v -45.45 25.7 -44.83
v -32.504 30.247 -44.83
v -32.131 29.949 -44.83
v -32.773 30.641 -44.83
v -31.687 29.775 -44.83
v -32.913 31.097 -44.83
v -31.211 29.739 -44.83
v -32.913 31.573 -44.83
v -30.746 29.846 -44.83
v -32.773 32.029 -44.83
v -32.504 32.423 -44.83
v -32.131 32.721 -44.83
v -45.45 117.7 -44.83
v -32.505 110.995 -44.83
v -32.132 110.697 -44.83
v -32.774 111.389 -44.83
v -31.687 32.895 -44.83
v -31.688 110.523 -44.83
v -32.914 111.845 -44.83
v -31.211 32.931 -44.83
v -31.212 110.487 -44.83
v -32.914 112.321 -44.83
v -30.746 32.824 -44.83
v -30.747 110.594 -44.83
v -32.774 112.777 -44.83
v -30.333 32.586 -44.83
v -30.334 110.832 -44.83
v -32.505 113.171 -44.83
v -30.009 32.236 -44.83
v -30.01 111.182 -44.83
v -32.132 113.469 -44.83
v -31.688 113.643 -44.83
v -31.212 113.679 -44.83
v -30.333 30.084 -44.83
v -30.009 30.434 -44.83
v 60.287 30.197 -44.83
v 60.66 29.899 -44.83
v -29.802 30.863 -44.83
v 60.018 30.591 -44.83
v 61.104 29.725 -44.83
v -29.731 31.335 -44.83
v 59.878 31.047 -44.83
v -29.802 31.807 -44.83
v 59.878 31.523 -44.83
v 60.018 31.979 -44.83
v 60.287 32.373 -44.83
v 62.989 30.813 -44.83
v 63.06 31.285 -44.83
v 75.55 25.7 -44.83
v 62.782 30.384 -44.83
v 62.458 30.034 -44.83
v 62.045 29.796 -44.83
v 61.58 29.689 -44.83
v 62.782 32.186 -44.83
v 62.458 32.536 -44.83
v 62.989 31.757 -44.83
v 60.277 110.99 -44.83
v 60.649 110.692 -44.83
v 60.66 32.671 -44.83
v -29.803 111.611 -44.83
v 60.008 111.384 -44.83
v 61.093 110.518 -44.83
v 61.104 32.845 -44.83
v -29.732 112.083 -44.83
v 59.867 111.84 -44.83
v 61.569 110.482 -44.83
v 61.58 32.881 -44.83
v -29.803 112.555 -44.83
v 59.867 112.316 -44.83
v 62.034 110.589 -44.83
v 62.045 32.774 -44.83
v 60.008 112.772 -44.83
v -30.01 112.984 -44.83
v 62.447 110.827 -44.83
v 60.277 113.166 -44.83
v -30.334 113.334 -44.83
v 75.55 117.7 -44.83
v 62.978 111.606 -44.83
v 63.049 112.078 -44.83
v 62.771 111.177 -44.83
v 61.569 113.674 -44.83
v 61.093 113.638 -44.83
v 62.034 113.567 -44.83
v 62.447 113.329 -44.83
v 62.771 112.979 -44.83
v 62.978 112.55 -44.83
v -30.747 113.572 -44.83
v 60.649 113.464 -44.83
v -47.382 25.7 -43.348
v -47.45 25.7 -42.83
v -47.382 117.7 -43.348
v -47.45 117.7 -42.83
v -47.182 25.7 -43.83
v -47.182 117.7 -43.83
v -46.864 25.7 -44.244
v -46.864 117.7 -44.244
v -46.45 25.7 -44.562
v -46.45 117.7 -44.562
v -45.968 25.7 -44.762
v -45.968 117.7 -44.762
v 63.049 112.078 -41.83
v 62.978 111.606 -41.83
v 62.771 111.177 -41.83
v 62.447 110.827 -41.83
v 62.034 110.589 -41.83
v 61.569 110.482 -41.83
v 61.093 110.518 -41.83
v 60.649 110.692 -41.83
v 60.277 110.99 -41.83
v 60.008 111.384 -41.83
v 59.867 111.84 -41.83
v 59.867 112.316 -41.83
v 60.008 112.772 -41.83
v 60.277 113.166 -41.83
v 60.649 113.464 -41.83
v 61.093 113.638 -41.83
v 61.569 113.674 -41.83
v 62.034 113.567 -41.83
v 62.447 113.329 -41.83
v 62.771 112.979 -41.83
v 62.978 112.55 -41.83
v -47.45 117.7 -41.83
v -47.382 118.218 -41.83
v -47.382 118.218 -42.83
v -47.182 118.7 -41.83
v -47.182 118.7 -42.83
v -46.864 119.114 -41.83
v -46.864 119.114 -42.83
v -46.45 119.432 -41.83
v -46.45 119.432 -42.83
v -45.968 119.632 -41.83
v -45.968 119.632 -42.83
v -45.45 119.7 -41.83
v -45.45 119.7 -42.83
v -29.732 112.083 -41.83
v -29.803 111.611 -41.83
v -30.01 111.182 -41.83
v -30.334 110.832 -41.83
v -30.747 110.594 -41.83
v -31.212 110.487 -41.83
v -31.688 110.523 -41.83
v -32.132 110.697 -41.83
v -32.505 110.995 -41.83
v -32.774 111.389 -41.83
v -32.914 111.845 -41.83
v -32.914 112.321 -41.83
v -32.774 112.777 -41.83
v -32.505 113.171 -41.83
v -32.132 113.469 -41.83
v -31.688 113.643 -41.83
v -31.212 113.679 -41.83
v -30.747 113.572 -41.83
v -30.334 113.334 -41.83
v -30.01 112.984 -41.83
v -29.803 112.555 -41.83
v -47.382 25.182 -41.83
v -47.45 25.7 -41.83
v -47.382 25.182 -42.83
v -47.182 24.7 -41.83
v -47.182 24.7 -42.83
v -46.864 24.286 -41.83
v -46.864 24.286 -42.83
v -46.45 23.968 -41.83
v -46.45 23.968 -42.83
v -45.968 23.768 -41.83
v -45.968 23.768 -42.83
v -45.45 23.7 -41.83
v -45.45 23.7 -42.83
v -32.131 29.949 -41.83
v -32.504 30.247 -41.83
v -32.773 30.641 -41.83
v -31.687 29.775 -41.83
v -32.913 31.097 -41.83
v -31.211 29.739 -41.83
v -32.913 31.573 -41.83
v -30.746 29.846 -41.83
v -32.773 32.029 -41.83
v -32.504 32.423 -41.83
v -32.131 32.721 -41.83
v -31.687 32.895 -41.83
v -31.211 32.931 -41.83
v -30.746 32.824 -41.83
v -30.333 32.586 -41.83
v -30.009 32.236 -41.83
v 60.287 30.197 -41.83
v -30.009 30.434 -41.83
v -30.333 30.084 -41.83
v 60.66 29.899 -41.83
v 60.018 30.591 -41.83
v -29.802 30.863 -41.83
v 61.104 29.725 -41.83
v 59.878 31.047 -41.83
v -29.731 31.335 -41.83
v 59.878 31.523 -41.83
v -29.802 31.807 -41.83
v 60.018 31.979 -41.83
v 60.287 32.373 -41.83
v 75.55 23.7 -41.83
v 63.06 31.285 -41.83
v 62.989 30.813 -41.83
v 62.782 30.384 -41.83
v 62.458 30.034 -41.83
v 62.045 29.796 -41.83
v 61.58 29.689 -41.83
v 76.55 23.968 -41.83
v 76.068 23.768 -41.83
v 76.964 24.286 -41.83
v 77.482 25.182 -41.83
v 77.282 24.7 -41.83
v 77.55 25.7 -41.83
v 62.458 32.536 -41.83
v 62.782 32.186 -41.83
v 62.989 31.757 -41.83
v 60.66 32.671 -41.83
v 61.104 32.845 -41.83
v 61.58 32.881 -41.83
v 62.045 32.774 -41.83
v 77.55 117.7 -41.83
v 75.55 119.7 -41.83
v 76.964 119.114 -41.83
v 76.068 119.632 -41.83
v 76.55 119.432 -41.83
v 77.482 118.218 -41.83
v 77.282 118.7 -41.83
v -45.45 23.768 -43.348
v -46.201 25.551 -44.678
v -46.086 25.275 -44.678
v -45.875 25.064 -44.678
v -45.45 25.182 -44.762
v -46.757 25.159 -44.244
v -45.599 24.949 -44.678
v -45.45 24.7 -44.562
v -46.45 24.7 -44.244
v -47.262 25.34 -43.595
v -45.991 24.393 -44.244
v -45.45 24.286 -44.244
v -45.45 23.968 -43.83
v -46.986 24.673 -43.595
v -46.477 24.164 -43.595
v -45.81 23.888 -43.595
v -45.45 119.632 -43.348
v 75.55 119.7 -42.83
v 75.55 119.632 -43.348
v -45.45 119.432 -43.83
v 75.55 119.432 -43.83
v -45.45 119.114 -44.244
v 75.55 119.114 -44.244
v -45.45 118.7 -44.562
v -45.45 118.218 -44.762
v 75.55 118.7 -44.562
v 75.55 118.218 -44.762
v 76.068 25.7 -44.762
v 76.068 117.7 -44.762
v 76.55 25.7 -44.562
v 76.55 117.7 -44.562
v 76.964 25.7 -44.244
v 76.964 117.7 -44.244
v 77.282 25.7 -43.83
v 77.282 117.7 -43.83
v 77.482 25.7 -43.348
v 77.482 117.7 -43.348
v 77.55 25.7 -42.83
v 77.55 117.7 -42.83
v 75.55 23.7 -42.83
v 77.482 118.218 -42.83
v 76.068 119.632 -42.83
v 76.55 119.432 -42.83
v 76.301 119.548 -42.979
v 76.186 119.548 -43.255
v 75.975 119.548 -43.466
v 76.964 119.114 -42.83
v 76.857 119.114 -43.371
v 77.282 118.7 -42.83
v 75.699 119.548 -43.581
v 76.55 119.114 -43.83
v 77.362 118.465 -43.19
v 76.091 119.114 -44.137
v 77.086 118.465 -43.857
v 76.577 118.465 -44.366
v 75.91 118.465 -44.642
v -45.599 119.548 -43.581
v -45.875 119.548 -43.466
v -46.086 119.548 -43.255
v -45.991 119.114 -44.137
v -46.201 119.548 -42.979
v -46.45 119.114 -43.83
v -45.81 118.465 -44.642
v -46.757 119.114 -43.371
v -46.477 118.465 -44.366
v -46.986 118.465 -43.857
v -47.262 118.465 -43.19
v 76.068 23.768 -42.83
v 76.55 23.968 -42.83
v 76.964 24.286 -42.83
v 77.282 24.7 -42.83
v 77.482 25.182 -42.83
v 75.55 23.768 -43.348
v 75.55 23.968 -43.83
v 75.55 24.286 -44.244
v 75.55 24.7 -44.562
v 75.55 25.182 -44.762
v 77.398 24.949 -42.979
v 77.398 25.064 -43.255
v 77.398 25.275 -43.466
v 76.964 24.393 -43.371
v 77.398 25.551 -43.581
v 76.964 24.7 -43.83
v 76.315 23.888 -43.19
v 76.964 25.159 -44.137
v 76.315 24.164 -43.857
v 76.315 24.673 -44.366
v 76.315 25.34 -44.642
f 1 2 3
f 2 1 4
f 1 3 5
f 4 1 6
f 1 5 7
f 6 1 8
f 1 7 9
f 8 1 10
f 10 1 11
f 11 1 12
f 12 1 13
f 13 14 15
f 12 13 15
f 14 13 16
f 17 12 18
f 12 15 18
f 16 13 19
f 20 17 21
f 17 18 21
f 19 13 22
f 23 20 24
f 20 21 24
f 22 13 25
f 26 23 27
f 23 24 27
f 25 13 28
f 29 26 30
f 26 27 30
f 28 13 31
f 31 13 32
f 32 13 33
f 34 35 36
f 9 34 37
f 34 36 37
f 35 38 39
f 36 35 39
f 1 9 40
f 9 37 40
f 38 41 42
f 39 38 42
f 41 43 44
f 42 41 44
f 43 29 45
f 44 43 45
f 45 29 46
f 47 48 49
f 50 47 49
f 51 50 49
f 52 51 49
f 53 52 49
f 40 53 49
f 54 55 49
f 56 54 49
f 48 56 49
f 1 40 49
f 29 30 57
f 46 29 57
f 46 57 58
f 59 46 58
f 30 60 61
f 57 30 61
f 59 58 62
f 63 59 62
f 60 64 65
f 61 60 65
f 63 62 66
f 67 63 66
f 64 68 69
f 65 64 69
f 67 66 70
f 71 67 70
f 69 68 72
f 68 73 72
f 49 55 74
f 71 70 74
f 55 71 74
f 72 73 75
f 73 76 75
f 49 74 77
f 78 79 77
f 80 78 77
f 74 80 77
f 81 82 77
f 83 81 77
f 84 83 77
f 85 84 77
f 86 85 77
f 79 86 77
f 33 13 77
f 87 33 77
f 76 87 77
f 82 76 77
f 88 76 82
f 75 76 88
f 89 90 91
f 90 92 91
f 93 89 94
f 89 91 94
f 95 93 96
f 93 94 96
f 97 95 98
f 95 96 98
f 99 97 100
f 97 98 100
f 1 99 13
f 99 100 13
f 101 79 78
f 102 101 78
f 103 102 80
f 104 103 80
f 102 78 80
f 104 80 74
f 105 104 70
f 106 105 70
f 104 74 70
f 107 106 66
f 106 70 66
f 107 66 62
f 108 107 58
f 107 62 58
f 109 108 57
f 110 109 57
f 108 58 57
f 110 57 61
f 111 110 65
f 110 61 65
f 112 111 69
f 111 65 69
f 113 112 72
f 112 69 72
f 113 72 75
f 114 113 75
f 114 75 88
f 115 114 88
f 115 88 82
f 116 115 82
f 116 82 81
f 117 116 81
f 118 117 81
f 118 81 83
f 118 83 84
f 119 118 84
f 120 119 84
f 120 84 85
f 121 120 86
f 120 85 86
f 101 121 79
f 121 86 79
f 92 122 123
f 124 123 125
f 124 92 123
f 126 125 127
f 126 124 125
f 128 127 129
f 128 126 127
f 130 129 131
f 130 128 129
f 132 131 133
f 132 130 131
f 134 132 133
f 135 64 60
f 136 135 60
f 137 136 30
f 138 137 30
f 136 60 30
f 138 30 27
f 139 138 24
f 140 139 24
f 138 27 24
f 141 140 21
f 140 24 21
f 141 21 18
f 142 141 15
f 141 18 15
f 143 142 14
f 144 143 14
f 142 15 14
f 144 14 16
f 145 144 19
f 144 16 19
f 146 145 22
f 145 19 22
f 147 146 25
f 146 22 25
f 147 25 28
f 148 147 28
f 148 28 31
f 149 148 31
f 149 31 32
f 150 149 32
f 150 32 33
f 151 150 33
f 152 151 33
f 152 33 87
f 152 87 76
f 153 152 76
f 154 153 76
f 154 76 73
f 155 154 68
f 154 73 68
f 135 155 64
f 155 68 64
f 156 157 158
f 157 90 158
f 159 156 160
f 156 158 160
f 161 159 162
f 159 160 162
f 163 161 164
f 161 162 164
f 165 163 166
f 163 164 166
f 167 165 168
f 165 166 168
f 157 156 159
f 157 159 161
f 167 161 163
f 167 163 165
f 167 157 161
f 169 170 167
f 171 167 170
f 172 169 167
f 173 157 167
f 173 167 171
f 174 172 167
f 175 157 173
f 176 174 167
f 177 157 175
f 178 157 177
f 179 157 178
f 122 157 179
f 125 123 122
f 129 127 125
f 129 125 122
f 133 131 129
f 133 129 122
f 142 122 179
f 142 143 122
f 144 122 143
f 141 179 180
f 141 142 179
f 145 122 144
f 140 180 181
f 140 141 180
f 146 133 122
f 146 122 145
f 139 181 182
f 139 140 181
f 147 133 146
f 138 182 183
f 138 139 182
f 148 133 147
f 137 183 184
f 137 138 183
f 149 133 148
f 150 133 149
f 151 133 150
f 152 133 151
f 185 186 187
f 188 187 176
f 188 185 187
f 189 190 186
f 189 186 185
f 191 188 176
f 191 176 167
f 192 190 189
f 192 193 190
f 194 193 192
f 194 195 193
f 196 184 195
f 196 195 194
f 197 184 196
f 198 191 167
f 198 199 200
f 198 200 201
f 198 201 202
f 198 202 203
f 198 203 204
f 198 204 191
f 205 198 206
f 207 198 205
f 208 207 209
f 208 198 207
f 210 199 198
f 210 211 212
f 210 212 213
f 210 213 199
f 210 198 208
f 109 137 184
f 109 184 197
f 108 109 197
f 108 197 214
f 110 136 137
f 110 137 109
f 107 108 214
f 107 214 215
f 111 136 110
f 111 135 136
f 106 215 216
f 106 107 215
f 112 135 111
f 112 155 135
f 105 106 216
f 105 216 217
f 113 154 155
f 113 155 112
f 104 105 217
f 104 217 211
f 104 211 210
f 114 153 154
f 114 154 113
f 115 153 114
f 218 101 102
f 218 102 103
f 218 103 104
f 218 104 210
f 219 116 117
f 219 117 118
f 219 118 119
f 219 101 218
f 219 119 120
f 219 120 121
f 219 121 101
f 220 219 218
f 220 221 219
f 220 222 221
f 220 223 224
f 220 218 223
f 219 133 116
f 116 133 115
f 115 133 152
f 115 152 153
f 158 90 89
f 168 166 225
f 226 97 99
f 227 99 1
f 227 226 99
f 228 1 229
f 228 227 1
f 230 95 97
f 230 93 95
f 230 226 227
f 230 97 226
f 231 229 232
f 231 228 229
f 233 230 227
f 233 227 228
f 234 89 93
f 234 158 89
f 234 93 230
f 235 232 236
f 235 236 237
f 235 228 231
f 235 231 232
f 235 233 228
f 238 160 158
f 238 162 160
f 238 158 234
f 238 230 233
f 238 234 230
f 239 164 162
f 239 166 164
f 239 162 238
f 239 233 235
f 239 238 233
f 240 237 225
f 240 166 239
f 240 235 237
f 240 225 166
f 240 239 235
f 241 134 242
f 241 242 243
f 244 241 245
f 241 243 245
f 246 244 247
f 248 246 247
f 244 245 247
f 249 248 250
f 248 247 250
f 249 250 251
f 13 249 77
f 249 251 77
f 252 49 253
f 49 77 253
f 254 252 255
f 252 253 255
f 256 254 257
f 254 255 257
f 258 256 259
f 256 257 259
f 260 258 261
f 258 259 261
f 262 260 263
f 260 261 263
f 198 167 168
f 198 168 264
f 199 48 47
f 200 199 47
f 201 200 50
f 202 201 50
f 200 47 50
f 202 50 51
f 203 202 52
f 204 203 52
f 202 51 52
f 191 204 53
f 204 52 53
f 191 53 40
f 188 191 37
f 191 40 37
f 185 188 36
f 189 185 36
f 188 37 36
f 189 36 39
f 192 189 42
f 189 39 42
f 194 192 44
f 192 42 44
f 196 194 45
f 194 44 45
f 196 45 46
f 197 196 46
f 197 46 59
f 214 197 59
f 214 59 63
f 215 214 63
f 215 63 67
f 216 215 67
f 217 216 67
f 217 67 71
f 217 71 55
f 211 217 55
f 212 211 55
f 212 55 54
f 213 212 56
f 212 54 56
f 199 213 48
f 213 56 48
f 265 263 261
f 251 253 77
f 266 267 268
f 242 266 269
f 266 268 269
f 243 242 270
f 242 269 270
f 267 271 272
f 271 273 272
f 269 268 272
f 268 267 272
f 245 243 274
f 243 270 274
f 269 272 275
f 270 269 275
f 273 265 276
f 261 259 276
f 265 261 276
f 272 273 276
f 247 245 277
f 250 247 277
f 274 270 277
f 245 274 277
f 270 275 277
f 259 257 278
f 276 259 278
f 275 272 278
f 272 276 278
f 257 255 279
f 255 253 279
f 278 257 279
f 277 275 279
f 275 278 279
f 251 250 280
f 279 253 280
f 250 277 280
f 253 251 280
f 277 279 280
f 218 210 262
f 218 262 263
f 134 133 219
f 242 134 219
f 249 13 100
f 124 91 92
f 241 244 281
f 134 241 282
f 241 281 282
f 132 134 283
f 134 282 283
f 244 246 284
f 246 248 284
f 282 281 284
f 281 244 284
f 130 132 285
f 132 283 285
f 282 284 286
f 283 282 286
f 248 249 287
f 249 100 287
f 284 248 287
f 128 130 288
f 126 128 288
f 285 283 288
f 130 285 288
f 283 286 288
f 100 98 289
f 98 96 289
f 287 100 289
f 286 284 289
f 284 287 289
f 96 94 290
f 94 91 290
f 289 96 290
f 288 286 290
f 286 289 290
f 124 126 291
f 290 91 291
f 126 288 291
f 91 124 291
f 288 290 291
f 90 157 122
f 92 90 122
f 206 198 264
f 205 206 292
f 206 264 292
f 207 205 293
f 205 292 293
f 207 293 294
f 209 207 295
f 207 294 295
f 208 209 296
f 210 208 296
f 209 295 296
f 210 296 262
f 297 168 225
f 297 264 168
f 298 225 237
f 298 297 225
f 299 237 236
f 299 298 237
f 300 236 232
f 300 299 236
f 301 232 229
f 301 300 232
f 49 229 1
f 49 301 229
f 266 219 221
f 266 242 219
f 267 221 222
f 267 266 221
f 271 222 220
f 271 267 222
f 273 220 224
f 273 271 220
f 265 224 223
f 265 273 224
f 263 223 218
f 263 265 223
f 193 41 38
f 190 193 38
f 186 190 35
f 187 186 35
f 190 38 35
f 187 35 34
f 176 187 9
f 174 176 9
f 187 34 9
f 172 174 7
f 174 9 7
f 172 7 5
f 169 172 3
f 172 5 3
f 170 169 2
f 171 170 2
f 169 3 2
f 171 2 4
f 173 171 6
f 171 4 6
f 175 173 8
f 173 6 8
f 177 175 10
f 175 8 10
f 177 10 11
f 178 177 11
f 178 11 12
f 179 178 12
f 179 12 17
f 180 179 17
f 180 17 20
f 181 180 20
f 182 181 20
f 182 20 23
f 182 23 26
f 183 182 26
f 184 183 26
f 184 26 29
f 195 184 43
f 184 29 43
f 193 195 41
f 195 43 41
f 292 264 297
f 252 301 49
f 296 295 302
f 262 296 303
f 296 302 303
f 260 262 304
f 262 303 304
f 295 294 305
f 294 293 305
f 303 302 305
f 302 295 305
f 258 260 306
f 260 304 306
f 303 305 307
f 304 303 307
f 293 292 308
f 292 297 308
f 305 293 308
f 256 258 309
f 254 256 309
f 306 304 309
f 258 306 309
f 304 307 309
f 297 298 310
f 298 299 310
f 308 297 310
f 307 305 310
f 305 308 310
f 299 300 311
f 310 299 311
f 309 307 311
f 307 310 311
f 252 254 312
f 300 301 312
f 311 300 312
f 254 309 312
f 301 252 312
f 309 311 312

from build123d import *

# Parameters (mm, degrees)
SKETCH041_W      = 125
SKETCH041_H      = 96
EXTRUDE024_DEPTH = 3
SKETCH042_R      = 1.6
HOLE016_DEPTH    = 3
HOLE016_TIPS_R   = 1.6
FILLET002_R      = 2


with BuildPart() as part:
    # Sketch041 → Extrude024 (new body)
    with BuildSketch(Plane.XY):
        with Locations((15.050004, 71.699999)):
            Rectangle(SKETCH041_W, SKETCH041_H)
    extrude(amount=-EXTRUDE024_DEPTH)

    # Sketch042 (on Face6 of BaseFeature004) → Hole016 (cut)
    with BuildSketch(Plane(origin=(0, 0, -3), x_dir=(1, 0, 0), z_dir=(0, 0, -1))):
        with Locations((-31.331001, -31.335001)):
            Circle(SKETCH042_R)
        with Locations((-31.332001, -112.083005)):
            Circle(SKETCH042_R)
        with Locations((61.449498, -112.077997)):
            Circle(SKETCH042_R)
        with Locations((61.460003, -31.285001)):
            Circle(SKETCH042_R)
    extrude(amount=-HOLE016_DEPTH, mode=Mode.SUBTRACT)

    # Hole016 tips → Hole016 tip 1 section 0
    with BuildSketch(Plane(origin=(0, 0, 0), x_dir=(1, 0, 0), z_dir=(0, 0, -1)), mode=Mode.PRIVATE) as hole016_tip_1_s0:
        with Locations((-31.331001, -31.335001)):
            Circle(HOLE016_TIPS_R)
    loft([hole016_tip_1_s0.sketch, Vertex(-31.331001, 31.335001, 0.961377)], mode=Mode.SUBTRACT)

    # Hole016 tips → Hole016 tip 2 section 0
    with BuildSketch(Plane(origin=(0, 0, 0), x_dir=(1, 0, 0), z_dir=(0, 0, -1)), mode=Mode.PRIVATE) as hole016_tip_2_s0:
        with Locations((-31.332001, -112.083005)):
            Circle(HOLE016_TIPS_R)
    loft([hole016_tip_2_s0.sketch, Vertex(-31.332001, 112.083005, 0.961377)], mode=Mode.SUBTRACT)

    # Hole016 tips → Hole016 tip 3 section 0
    with BuildSketch(Plane(origin=(0, 0, 0), x_dir=(1, 0, 0), z_dir=(0, 0, -1)), mode=Mode.PRIVATE) as hole016_tip_3_s0:
        with Locations((61.449498, -112.077997)):
            Circle(HOLE016_TIPS_R)
    loft([hole016_tip_3_s0.sketch, Vertex(61.449498, 112.077997, 0.961377)], mode=Mode.SUBTRACT)

    # Hole016 tips → Hole016 tip 4 section 0
    with BuildSketch(Plane(origin=(0, 0, 0), x_dir=(1, 0, 0), z_dir=(0, 0, -1)), mode=Mode.PRIVATE) as hole016_tip_4_s0:
        with Locations((61.460003, -31.285001)):
            Circle(HOLE016_TIPS_R)
    loft([hole016_tip_4_s0.sketch, Vertex(61.460003, 31.285001, 0.961377)], mode=Mode.SUBTRACT)

    # Fillet002
    fillet002_edges = [part.edges().sort_by_distance(p)[0] for p in [
        (-47.449996, 23.699999, -1.5),
        (-47.449996, 71.699999, -3),
        (15.050004, 23.699999, -3),
        (77.550004, 23.699999, -1.5),
        (77.550004, 71.699999, -3),
        (77.550004, 119.699999, -1.5),
        (15.050004, 119.699999, -3),
        (-47.449996, 119.699999, -1.5),
    ]]
    fillet(fillet002_edges, radius=FILLET002_R)


with BuildPart() as part_1:
    # Body003 placement: moved
    add(part.part.moved(Location((0, 0, -41.83))))


solid = part_1.part
